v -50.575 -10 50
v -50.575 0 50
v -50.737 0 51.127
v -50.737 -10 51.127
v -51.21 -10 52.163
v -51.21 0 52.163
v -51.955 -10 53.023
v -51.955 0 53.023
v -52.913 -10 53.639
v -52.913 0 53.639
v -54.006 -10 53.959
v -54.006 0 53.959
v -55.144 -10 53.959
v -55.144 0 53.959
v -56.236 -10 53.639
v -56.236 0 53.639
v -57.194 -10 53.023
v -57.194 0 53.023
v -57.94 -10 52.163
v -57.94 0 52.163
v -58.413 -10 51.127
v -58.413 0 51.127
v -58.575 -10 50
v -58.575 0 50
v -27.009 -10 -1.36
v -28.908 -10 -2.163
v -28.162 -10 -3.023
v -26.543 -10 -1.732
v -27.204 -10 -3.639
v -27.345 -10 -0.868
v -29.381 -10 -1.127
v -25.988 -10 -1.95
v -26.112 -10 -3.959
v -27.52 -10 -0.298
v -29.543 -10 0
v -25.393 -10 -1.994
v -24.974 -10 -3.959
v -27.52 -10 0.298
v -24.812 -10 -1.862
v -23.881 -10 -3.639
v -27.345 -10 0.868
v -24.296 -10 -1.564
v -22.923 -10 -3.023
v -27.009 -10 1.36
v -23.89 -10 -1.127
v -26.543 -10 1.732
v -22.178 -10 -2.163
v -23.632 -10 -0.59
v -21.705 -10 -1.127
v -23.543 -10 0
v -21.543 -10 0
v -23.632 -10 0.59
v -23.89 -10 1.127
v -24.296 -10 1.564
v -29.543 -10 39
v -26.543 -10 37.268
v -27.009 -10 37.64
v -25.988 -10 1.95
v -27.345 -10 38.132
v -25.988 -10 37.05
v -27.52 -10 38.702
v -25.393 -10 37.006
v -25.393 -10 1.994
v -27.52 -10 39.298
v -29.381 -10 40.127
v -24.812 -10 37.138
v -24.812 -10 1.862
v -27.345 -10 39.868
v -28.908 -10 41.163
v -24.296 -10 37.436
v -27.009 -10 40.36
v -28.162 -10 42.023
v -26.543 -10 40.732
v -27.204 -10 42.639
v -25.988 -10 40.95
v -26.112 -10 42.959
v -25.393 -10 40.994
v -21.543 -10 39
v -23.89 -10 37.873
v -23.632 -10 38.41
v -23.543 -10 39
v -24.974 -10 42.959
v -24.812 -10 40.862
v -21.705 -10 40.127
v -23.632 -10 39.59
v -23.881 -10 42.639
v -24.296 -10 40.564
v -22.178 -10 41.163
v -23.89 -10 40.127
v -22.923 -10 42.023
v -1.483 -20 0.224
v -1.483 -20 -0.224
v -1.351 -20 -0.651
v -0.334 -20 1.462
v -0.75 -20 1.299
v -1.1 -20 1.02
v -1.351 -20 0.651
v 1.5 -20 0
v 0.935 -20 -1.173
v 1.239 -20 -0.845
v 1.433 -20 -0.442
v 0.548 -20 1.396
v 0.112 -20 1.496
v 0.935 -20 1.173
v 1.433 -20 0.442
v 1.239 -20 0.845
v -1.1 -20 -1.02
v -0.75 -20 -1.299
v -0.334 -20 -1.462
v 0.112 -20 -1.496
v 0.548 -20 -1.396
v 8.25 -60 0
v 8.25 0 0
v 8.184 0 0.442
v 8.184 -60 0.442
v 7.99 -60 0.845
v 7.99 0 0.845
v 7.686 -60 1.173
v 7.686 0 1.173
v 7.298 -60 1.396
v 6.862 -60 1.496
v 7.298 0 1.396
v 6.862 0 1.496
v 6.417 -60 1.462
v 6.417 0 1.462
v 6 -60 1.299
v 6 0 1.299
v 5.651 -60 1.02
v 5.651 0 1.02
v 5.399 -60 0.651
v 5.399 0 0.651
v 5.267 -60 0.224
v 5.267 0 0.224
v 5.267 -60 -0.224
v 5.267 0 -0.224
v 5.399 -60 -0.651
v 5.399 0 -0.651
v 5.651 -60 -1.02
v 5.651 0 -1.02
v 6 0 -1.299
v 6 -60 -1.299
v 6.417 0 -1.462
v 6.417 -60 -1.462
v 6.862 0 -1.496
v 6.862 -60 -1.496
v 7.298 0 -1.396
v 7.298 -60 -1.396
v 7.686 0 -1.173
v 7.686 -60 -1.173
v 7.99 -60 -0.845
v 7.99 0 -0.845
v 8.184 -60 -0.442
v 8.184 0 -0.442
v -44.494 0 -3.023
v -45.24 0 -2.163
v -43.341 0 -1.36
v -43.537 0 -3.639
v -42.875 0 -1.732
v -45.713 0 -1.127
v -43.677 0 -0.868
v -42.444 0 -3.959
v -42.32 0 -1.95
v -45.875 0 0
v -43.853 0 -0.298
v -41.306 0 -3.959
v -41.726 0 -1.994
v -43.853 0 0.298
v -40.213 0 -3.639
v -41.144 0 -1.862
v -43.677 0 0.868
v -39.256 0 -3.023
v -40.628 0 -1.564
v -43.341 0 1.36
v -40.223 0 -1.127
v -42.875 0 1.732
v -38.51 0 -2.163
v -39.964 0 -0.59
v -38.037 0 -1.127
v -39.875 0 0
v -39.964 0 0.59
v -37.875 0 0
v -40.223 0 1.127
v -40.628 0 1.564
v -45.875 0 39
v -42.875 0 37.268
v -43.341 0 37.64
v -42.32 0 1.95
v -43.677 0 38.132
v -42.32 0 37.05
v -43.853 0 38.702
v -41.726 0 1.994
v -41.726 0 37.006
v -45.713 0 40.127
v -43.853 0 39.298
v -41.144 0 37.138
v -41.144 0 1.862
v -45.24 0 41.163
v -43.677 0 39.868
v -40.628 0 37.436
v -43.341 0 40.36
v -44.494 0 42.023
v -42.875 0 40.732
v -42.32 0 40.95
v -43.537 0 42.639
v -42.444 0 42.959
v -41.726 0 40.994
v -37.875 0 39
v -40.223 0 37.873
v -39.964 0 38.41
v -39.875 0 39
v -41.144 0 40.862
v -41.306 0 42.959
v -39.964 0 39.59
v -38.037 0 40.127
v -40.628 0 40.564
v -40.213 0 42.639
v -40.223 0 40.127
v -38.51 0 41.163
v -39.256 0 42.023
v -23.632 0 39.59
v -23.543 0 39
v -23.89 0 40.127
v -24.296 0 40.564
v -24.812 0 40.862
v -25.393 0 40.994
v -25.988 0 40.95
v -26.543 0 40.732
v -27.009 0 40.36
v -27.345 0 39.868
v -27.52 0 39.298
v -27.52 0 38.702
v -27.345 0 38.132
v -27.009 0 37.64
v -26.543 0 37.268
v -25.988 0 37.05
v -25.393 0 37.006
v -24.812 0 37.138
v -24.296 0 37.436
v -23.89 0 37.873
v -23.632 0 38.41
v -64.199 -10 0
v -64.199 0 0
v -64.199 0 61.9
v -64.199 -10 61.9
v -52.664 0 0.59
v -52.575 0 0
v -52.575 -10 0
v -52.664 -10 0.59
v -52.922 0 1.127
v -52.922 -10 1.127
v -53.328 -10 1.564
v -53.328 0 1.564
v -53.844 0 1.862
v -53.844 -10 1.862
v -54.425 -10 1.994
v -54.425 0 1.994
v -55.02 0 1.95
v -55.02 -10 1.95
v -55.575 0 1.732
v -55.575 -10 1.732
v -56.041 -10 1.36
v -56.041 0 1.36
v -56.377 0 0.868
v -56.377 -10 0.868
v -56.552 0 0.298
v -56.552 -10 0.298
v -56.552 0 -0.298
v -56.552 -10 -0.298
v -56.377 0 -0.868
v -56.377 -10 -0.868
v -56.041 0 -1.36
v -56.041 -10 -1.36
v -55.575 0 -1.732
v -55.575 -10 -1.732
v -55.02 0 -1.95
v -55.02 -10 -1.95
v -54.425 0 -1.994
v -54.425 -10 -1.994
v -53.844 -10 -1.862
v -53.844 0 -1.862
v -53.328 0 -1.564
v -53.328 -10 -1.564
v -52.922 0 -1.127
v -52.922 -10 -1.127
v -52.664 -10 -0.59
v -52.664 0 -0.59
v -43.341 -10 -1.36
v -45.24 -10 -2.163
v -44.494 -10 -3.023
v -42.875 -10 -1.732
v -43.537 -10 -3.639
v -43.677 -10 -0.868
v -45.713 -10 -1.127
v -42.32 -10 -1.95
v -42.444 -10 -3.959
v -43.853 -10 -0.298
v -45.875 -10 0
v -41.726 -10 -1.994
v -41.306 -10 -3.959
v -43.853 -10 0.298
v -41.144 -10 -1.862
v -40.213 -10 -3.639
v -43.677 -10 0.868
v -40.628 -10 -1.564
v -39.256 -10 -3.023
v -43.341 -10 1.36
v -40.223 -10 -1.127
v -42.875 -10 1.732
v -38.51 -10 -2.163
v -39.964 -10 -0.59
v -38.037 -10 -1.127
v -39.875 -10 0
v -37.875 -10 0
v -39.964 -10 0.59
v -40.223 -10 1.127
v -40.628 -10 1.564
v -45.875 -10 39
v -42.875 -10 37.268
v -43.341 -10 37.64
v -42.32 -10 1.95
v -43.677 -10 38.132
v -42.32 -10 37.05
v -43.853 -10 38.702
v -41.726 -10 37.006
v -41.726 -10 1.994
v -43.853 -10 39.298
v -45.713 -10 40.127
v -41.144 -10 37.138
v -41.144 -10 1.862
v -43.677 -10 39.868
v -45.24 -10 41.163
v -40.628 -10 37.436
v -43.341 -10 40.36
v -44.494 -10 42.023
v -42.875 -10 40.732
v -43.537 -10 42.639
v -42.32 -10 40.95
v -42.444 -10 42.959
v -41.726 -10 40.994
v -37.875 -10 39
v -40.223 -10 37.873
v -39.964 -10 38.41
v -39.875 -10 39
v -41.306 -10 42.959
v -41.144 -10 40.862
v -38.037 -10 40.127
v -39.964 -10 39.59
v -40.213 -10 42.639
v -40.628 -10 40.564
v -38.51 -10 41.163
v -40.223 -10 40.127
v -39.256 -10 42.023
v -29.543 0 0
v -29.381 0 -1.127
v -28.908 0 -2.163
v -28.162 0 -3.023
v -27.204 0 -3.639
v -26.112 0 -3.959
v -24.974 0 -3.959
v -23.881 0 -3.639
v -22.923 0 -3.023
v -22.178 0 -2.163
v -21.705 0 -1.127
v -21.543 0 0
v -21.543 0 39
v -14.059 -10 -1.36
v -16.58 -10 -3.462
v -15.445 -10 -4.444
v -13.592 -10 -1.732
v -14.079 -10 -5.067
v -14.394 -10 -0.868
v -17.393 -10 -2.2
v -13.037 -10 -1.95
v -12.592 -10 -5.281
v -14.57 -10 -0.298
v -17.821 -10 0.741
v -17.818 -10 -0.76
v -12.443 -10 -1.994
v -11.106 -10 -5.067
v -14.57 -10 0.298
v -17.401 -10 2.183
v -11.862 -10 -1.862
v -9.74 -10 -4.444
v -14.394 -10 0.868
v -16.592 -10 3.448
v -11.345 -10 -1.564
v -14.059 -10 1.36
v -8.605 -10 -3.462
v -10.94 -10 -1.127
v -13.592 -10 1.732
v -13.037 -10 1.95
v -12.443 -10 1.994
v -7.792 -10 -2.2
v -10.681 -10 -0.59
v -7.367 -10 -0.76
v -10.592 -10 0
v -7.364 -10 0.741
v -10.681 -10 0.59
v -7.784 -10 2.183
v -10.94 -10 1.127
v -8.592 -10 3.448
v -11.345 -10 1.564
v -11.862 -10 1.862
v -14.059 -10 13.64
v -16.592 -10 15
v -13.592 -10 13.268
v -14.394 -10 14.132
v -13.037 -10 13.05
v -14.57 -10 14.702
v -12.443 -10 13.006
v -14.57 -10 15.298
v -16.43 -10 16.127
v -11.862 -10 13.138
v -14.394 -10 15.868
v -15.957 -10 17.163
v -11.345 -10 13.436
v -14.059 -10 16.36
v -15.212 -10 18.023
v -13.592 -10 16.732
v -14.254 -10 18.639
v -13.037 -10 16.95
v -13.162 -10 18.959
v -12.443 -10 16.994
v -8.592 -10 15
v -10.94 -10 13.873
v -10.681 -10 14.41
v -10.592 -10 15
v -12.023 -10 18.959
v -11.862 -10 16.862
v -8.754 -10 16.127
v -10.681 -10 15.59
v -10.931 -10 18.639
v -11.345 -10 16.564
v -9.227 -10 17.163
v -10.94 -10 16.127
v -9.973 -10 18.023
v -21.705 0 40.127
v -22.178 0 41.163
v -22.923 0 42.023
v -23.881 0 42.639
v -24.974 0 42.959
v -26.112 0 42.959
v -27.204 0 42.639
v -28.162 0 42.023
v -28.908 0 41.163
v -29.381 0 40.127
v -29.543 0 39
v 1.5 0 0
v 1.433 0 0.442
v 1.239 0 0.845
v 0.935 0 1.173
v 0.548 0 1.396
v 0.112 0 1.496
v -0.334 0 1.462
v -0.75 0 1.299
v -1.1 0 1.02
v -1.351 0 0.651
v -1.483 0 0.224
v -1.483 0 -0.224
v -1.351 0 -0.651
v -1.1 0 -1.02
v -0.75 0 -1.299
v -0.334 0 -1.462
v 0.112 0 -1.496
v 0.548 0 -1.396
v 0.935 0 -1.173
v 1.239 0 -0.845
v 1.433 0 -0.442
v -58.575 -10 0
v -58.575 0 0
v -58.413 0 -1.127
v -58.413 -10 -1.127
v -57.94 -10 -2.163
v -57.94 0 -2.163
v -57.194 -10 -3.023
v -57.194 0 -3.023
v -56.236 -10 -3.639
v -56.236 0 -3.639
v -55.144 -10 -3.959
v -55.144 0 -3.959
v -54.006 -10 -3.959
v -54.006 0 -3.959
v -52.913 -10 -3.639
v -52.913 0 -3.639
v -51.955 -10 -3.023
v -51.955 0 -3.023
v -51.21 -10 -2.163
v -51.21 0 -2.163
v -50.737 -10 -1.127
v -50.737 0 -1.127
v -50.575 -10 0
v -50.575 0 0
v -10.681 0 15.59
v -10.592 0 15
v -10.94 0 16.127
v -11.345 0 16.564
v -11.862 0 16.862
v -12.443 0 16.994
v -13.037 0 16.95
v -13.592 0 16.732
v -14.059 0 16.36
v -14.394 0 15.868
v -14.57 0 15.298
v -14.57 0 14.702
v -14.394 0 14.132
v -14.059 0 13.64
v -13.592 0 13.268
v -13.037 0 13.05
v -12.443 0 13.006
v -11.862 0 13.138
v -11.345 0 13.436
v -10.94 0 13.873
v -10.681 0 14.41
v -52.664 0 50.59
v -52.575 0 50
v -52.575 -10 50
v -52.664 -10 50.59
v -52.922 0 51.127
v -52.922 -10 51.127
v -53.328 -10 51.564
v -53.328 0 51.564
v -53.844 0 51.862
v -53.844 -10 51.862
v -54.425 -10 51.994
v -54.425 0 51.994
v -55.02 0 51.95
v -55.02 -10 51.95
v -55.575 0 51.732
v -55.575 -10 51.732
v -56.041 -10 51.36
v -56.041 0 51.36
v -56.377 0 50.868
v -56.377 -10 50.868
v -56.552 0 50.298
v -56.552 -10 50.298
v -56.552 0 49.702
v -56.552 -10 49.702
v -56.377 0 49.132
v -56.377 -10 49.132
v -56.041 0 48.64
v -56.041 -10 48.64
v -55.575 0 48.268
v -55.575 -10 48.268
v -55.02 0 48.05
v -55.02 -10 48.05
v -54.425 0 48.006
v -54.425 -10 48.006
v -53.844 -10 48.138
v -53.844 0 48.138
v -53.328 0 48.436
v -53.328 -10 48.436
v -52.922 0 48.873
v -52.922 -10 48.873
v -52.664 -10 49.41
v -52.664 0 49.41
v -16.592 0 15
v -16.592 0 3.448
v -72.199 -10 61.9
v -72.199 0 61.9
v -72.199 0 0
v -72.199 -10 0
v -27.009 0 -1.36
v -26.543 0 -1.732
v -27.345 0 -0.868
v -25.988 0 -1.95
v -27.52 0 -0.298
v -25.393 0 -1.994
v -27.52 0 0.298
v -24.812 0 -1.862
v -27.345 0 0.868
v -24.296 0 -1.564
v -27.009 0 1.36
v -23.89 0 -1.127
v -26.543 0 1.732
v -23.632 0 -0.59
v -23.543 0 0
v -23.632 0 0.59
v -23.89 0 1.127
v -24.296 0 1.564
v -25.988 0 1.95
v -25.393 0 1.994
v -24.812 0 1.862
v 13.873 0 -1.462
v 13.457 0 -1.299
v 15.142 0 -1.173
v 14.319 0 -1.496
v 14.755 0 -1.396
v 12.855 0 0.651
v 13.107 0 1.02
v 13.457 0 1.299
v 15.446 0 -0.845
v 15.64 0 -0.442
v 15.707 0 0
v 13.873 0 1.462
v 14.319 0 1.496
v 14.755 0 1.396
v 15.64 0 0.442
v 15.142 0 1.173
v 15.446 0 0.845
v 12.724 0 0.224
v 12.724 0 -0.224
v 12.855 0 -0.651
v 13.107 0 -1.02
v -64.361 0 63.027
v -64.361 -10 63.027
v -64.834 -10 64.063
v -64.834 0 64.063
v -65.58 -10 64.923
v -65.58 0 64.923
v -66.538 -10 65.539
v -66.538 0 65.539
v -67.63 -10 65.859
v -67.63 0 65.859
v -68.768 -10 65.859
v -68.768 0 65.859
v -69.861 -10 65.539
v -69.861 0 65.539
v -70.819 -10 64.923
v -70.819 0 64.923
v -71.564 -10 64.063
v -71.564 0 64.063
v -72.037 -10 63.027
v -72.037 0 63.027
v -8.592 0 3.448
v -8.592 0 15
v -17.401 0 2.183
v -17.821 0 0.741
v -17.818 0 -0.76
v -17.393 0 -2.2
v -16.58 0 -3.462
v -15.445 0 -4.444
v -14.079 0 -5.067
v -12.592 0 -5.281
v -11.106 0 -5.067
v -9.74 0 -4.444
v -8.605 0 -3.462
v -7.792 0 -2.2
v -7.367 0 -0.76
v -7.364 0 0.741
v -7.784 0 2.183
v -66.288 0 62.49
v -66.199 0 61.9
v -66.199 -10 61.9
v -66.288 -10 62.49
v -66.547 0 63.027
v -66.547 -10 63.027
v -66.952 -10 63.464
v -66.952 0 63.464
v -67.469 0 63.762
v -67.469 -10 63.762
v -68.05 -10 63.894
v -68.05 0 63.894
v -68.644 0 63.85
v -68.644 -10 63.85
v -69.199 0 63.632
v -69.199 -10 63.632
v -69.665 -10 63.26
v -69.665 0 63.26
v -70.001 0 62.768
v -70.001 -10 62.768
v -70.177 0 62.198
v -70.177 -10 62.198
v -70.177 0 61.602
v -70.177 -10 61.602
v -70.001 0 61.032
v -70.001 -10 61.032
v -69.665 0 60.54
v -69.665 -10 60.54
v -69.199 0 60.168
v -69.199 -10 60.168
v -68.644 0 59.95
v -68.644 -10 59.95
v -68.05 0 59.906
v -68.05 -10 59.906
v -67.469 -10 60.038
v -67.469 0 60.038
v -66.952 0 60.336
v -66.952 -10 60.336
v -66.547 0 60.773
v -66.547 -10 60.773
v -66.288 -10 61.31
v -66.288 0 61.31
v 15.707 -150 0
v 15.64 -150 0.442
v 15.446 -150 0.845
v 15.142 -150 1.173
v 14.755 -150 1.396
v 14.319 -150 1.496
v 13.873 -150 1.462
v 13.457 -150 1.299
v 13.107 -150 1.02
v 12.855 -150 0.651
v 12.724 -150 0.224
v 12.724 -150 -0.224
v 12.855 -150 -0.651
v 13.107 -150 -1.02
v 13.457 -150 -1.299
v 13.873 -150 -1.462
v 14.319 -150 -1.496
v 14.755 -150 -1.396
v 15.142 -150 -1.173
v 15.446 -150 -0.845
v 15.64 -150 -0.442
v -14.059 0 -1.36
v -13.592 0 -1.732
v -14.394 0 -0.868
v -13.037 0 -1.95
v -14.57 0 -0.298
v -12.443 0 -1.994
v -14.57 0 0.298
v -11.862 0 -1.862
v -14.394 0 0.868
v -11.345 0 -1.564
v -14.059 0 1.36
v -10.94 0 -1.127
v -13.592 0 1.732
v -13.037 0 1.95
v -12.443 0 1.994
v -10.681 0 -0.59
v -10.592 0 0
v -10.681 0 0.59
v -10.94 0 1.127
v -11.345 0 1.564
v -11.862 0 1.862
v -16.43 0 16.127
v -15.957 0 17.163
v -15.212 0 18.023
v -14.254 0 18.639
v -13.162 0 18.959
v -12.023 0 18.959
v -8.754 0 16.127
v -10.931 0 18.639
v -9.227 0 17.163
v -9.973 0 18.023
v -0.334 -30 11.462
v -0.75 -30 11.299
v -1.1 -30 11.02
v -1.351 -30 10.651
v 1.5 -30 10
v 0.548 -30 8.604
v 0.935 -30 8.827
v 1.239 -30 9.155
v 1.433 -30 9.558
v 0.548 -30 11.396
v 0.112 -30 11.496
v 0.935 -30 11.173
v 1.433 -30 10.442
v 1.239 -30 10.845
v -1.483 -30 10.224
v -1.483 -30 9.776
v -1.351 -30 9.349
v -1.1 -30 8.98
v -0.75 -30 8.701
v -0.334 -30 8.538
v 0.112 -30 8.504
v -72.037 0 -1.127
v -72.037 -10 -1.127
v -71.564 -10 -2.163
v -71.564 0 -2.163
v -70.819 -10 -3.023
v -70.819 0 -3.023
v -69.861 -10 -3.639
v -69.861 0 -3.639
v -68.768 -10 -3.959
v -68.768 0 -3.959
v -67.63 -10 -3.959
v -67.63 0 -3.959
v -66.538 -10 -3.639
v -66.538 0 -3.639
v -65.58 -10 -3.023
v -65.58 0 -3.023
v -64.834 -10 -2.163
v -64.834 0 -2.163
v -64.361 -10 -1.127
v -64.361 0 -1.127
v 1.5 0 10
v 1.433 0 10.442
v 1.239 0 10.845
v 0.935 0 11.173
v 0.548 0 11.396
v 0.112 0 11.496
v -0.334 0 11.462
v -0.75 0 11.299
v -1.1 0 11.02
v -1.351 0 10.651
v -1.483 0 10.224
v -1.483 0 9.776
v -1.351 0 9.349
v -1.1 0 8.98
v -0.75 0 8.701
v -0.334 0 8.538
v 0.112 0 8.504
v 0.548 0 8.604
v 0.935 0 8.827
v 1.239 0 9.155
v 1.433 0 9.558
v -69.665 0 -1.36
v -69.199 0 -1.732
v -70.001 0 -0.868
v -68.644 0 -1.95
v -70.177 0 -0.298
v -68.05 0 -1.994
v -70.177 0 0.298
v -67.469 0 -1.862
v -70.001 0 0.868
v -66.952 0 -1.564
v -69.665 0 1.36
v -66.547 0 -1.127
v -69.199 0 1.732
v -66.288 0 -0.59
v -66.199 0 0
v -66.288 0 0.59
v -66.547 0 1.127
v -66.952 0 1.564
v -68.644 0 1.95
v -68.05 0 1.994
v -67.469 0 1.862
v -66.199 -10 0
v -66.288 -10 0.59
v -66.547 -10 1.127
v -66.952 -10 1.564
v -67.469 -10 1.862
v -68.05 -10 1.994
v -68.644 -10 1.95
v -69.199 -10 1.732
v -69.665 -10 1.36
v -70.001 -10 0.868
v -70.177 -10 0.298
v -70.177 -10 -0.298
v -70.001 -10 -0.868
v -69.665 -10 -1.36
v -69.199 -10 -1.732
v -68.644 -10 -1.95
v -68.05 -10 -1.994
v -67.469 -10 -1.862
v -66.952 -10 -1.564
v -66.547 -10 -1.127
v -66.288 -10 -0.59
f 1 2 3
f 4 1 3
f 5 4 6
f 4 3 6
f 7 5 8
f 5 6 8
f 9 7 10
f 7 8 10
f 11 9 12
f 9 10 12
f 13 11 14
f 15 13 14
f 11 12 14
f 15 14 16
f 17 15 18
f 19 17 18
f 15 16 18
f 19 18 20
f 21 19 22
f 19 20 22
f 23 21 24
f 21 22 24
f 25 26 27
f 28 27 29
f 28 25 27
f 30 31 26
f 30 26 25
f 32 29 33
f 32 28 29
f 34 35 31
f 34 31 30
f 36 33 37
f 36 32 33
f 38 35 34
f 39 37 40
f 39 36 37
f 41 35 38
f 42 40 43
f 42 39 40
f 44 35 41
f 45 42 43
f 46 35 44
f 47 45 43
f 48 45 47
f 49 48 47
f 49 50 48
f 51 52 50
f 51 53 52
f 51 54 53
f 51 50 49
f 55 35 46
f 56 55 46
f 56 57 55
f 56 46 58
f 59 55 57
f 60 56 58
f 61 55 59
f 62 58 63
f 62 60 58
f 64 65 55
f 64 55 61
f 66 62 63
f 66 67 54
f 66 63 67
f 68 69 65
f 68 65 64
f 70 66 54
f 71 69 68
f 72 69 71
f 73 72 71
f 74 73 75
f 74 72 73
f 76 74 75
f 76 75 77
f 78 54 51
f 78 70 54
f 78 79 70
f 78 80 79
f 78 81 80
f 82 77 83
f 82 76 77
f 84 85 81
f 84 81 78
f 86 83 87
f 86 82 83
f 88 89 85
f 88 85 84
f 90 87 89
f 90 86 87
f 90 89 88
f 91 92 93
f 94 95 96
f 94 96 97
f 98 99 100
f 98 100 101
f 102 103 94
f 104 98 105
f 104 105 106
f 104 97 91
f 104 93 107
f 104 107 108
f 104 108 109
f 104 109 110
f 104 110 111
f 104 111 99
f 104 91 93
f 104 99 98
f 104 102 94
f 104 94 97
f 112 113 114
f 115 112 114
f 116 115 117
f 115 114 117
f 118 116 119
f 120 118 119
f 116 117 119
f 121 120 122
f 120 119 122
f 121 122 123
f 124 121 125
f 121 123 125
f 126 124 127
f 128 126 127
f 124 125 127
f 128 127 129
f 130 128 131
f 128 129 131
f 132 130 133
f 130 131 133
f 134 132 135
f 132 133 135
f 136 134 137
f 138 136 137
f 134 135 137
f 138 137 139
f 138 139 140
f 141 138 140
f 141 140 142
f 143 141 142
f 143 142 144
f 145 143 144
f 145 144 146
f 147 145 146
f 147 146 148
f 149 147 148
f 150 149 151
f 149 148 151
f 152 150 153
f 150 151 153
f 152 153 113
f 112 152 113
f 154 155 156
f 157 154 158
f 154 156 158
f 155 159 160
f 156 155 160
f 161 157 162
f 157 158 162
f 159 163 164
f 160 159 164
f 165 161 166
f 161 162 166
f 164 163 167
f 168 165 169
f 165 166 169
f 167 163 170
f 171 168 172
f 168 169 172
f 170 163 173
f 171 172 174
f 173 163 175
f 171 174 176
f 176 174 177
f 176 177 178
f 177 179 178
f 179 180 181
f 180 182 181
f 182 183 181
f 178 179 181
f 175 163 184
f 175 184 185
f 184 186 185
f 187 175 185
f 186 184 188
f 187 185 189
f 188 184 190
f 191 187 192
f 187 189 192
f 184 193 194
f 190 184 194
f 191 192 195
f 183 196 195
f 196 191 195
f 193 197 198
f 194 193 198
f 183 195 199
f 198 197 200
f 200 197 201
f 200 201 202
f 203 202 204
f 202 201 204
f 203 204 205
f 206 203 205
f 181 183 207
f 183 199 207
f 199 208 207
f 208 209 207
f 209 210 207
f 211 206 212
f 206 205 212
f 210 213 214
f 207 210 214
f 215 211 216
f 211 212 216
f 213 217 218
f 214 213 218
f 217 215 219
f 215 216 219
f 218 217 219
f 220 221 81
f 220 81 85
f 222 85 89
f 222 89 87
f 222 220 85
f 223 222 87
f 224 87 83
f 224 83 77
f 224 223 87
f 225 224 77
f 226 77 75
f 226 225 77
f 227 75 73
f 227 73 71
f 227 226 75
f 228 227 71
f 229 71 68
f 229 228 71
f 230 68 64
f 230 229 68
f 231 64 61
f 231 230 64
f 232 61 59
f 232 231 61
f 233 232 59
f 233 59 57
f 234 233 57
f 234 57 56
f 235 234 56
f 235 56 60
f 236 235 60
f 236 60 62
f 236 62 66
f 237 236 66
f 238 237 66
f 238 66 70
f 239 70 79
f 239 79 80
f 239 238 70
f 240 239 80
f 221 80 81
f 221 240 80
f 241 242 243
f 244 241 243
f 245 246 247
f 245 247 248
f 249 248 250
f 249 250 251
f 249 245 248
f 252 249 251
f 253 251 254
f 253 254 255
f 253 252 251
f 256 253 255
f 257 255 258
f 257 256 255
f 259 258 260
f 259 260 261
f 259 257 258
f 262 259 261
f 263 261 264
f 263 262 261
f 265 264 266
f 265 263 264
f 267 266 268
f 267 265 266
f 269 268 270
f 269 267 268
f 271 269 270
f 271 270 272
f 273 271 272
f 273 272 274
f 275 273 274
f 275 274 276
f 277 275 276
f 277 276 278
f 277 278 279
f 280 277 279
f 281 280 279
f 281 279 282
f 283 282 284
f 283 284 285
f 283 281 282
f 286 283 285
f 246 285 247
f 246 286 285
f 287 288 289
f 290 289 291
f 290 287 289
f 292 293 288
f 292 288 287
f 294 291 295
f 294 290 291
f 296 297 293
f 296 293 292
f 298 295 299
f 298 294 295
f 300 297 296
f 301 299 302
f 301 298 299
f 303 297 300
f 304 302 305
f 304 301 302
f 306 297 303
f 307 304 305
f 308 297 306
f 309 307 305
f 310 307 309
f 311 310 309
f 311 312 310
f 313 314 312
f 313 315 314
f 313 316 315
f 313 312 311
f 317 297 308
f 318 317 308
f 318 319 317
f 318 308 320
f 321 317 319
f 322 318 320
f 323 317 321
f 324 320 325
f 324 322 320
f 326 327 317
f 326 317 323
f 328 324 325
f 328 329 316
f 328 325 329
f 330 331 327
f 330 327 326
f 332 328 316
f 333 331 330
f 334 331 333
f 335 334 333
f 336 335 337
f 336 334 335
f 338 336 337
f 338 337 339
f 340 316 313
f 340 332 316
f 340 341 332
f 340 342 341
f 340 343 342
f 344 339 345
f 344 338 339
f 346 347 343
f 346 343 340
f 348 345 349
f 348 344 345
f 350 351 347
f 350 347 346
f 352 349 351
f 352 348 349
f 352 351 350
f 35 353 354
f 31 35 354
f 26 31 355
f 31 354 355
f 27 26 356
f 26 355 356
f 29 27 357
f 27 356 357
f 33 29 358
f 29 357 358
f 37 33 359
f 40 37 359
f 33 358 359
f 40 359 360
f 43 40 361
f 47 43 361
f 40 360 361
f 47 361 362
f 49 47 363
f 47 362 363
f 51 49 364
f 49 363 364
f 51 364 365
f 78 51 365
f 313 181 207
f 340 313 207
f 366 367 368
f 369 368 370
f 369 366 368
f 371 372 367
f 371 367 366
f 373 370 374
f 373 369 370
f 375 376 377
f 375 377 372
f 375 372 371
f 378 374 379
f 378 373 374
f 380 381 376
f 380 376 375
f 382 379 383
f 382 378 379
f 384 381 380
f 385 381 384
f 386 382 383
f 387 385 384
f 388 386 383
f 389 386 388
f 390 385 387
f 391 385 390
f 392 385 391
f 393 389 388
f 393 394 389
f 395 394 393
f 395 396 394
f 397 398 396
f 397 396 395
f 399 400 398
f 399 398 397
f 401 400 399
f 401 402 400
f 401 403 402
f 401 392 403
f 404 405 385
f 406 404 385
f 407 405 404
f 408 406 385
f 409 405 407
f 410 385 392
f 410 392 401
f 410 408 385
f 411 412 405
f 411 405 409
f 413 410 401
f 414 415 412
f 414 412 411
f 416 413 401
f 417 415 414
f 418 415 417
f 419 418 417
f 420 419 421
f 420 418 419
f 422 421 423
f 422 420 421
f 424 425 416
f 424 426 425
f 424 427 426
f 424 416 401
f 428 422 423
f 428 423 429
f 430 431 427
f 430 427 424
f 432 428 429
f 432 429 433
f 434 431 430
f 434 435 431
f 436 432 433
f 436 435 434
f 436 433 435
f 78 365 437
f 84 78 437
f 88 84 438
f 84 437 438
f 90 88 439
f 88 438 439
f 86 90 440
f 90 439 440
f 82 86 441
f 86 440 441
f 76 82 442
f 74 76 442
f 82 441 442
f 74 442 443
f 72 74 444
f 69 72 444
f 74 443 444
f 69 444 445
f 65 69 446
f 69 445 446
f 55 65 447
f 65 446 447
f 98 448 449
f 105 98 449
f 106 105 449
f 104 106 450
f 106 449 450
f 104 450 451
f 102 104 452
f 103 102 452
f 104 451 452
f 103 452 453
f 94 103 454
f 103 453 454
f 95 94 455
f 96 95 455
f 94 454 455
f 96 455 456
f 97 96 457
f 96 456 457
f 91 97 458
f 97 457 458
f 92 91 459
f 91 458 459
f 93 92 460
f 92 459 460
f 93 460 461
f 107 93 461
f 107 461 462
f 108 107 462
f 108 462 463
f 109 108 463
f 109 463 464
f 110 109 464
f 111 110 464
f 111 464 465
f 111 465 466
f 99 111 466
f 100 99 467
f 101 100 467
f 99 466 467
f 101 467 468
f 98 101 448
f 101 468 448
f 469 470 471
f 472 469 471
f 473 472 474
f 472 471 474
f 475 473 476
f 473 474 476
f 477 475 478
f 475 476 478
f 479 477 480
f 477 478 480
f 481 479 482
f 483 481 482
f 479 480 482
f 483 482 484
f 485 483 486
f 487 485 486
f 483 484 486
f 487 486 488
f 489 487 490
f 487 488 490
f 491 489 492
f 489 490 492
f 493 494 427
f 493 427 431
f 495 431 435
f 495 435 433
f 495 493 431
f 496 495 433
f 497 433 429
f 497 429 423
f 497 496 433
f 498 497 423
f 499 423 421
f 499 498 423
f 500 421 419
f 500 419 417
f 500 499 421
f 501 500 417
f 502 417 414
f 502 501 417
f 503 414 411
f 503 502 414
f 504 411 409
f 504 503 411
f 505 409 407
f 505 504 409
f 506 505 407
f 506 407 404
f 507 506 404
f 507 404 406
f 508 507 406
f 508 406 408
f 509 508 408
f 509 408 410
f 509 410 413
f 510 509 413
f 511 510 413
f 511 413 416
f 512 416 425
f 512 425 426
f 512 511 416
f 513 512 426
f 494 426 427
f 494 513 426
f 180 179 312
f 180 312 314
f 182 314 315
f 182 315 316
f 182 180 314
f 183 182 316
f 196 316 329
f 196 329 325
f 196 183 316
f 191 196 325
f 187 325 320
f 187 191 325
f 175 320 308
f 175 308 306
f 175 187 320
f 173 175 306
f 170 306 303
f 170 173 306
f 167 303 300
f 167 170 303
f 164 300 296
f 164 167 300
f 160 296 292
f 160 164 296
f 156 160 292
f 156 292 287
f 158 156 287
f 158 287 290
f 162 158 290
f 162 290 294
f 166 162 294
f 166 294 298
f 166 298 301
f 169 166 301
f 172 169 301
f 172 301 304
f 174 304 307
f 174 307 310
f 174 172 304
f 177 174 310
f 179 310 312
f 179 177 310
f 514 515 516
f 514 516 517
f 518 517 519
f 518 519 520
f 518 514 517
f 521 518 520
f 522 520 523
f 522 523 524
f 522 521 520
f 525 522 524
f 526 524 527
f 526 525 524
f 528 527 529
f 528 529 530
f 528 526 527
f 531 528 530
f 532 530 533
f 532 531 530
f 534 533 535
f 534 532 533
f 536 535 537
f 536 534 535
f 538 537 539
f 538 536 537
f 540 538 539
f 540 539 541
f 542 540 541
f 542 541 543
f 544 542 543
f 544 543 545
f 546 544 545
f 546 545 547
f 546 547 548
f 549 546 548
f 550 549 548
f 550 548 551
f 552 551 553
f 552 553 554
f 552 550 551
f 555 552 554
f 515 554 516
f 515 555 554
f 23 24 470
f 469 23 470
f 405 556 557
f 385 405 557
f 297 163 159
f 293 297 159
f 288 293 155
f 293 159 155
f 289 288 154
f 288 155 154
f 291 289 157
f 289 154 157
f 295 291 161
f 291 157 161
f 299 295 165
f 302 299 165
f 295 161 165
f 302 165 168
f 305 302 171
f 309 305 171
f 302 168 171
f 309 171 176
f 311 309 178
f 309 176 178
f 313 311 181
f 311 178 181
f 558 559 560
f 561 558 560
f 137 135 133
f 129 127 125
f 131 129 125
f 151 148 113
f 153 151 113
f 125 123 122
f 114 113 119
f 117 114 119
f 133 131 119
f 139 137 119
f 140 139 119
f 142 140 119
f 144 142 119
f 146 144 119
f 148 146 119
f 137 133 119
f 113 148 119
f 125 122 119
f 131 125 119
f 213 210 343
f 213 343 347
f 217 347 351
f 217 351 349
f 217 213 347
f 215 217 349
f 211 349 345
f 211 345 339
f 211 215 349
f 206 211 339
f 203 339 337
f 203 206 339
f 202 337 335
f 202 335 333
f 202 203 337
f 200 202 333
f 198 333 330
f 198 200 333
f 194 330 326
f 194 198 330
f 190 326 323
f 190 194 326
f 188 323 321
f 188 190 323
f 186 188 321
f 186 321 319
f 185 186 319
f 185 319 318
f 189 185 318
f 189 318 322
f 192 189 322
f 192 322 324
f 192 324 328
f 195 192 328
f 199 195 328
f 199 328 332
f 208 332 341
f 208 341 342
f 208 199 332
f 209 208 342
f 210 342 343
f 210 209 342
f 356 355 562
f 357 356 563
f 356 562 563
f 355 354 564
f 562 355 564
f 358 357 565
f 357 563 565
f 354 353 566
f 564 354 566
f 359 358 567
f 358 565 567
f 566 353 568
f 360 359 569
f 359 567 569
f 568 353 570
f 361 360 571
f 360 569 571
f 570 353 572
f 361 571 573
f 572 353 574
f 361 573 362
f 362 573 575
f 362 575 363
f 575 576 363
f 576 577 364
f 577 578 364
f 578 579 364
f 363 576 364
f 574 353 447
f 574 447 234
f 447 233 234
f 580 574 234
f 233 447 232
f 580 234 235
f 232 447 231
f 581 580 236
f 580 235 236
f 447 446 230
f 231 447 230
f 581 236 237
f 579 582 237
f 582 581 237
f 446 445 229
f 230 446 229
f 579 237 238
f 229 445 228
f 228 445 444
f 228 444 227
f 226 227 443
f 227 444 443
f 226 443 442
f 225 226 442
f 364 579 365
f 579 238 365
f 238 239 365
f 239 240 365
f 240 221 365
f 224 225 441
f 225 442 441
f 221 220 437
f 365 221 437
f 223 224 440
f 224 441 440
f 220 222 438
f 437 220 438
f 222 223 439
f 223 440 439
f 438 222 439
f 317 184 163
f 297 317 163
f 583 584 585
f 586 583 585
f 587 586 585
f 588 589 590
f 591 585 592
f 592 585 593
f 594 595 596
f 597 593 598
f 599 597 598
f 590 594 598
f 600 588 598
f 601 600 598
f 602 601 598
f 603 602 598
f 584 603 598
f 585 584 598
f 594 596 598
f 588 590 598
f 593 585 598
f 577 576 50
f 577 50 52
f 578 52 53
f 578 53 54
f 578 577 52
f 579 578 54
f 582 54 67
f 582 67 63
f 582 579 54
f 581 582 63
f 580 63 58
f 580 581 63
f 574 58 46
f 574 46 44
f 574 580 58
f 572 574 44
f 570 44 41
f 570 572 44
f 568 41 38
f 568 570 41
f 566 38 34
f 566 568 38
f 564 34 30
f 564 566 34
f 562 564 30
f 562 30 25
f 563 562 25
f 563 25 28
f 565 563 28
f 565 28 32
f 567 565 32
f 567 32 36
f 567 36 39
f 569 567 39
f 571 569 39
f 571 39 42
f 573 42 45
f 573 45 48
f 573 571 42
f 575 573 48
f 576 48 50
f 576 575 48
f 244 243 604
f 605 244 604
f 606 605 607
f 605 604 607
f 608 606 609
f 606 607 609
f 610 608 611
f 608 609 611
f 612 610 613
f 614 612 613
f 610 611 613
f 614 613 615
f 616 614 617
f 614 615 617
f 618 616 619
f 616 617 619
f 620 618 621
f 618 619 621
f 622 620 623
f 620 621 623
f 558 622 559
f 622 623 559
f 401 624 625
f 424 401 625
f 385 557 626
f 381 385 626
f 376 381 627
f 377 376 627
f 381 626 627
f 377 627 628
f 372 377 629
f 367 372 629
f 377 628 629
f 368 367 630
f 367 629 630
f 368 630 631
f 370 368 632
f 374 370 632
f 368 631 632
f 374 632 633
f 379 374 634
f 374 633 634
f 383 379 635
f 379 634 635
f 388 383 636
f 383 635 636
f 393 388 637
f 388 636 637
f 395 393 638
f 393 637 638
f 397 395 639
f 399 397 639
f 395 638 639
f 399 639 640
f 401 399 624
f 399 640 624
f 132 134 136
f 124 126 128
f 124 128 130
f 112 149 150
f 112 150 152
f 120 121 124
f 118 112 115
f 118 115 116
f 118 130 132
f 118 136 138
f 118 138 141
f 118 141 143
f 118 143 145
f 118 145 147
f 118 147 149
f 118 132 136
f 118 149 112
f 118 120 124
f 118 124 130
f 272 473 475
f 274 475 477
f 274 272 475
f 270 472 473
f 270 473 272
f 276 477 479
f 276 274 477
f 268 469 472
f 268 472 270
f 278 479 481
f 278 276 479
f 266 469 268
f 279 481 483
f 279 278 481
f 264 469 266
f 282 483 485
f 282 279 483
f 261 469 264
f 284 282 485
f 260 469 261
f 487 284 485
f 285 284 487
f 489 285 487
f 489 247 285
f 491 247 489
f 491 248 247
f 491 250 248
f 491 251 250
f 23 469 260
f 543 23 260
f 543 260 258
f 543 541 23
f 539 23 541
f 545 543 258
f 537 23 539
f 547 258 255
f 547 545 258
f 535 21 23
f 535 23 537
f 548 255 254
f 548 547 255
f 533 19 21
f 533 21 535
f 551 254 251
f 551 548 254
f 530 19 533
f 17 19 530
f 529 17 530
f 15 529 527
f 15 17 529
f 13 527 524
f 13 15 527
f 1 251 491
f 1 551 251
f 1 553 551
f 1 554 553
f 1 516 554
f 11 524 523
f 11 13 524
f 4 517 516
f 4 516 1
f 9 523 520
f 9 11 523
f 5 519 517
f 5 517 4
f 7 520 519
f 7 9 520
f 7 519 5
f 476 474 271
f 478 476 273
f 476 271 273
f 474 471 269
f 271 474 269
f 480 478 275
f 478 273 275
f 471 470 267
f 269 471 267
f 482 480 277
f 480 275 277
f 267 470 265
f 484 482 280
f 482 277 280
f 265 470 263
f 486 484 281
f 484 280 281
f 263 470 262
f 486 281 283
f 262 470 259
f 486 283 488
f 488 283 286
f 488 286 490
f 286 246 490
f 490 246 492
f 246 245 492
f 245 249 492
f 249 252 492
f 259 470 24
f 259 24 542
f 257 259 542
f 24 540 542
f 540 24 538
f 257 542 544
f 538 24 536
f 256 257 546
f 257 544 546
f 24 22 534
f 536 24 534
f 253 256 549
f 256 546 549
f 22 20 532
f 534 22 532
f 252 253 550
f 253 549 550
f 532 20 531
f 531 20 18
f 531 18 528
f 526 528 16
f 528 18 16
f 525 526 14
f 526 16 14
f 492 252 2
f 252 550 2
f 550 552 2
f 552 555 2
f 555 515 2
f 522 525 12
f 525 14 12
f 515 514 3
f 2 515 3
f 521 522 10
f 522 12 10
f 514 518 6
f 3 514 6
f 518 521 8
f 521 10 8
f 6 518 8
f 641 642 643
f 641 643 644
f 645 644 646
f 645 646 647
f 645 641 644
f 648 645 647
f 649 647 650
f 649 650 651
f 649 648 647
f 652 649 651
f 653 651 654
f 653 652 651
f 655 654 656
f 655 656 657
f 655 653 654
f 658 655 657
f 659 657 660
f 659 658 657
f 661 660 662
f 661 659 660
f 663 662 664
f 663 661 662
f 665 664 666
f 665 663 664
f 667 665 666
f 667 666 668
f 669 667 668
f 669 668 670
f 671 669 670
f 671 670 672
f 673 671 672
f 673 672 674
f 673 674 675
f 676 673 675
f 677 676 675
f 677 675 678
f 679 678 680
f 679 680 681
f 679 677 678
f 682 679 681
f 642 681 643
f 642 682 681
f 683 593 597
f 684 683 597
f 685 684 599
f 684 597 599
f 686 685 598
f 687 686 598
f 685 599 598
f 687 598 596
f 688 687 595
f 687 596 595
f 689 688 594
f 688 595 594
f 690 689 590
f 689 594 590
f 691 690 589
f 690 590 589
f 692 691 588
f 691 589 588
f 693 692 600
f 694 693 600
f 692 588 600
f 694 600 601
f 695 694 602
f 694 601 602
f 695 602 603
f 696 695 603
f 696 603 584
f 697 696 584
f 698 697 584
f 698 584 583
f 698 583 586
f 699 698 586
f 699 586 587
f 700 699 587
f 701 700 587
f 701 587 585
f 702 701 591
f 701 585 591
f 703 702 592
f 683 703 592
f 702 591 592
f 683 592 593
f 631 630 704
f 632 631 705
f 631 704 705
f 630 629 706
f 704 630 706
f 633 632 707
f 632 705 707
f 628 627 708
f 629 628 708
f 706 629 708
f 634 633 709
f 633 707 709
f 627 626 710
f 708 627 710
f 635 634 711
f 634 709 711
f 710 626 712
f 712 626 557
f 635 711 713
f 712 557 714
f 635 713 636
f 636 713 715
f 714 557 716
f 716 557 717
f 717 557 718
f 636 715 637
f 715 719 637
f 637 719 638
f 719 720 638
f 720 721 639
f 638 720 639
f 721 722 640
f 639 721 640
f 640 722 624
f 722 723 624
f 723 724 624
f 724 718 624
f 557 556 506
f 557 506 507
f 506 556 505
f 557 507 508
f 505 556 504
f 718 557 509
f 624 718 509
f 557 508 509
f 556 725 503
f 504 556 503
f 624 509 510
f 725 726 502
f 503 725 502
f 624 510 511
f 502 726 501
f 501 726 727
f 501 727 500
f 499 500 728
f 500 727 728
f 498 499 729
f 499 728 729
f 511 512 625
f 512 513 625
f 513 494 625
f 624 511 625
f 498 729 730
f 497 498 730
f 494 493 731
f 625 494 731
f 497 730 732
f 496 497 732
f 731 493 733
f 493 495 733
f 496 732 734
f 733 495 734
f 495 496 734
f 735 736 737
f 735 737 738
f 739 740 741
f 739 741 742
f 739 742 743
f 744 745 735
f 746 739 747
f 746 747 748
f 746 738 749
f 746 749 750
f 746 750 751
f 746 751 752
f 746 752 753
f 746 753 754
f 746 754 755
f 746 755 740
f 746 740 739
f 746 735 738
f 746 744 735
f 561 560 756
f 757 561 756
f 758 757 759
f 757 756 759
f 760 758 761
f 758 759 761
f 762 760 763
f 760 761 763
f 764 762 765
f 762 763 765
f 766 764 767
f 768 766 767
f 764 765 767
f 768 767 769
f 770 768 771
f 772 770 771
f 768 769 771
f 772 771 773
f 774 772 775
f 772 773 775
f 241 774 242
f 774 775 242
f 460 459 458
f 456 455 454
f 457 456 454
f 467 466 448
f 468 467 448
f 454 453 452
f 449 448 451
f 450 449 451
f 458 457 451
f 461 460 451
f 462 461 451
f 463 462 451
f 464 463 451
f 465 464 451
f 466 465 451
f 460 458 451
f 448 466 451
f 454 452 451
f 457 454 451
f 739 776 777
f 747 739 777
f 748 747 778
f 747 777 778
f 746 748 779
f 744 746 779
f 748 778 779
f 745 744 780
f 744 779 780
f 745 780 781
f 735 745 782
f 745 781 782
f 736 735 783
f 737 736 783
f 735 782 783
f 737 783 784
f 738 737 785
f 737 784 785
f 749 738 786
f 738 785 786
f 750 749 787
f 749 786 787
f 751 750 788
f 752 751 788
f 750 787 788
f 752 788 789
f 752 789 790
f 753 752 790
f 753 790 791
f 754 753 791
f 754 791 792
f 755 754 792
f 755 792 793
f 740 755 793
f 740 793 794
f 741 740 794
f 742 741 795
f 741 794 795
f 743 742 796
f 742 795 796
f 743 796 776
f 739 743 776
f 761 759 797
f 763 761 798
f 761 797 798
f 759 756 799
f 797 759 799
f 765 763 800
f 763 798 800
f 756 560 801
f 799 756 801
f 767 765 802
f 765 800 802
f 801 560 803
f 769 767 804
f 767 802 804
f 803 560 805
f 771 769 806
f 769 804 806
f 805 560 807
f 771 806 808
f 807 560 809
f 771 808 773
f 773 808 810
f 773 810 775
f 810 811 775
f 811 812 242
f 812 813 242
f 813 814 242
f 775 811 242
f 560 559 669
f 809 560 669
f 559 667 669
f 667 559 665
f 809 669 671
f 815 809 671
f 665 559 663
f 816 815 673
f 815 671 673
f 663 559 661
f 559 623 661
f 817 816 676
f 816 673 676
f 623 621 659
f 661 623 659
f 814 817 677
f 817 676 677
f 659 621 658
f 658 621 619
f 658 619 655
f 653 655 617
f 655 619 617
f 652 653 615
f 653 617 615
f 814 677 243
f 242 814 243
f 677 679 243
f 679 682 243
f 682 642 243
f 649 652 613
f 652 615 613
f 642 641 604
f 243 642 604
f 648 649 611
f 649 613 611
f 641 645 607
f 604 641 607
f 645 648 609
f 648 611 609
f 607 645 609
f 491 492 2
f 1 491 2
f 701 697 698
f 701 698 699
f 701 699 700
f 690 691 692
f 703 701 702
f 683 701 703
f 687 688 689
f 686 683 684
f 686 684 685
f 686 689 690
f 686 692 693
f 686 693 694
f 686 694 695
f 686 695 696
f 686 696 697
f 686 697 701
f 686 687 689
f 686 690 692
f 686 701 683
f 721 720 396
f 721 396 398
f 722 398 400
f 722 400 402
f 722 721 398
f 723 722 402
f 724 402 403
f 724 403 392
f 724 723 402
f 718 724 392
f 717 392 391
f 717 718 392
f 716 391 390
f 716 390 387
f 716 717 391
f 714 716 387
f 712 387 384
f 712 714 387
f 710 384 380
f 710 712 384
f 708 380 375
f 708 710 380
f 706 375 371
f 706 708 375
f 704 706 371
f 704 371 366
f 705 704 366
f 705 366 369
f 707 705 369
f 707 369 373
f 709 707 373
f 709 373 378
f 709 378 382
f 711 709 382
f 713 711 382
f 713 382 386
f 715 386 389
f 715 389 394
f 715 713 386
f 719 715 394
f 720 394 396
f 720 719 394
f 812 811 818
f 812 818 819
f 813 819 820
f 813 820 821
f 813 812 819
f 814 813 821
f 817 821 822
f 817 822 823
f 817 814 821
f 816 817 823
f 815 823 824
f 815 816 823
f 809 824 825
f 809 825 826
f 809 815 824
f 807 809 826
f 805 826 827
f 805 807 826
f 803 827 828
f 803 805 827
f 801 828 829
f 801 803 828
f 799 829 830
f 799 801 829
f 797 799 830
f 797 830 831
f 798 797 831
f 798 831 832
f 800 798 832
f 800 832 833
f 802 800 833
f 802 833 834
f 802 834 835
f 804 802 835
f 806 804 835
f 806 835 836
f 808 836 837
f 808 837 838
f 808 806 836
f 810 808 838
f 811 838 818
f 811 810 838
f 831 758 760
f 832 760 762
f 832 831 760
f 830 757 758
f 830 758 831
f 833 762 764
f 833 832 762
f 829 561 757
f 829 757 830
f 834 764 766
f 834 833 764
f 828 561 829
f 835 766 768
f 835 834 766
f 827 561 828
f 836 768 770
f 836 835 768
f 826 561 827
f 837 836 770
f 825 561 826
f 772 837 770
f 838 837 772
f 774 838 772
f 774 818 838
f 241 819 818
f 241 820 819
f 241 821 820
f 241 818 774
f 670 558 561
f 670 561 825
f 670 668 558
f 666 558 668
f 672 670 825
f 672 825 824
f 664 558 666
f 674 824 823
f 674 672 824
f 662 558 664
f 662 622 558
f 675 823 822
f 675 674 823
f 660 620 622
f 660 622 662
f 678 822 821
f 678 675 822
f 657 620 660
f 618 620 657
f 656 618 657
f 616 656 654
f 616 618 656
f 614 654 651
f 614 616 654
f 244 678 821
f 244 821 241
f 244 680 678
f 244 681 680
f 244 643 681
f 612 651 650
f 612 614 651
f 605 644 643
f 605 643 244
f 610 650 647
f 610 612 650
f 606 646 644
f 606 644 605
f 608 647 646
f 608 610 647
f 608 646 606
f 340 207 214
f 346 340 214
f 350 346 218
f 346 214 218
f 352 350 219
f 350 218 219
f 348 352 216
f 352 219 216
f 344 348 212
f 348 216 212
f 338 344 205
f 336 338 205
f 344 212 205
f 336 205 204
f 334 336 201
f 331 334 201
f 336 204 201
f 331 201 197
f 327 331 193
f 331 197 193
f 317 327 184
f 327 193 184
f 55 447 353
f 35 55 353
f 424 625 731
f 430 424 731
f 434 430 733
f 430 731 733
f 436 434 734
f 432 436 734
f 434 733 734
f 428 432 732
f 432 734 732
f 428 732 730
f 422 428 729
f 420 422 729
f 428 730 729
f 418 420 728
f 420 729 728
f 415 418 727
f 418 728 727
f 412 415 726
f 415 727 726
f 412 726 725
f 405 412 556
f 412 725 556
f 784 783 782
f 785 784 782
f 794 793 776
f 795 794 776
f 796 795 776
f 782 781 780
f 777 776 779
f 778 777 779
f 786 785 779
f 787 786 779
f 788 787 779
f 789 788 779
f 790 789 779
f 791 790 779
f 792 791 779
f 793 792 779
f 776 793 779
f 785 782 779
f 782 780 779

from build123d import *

# Parameters (mm, degrees)
F1_R      = 2
F2_DEPTH  = 10
F3_R      = 2
F4_DEPTH  = 10
F5_R      = 2
F6_DEPTH  = 10
F7_R      = 2
F8_DEPTH  = 10
F9_R      = 2
F10_DEPTH = 10
F11_R     = 1.5
F12_DEPTH = 20
F13_R     = 1.5
F14_DEPTH = 60
F15_DEPTH = 150
F16_R     = 1.5
F17_DEPTH = 30


# Not quite as in the source:
# - a feature names something its author has since deleted; it is built from what else it names


with BuildPart() as f2:
    # F1 (on Front) → F2 (new body)
    with BuildSketch(Plane.XZ):
        with BuildLine():
            Line((-8.5924360901, 3.4478561794), (-8.5924360901, 15))
            ThreePointArc((-8.5924360901, 15), (-12.5924360901, 19), (-16.5924360901, 15))
            Line((-16.5924360901, 15), (-16.5924360901, 3.4478561794))
            ThreePointArc((-16.5924360901, 3.4478561794), (-12.5924360901, -5.2808817667), (-8.5924360901, 3.4478561794))
        make_face()
        with Locations((-12.5924360901, 0)):
            Circle(F1_R, mode=Mode.SUBTRACT)
        with Locations((-12.5924360901, 15)):
            Circle(F1_R, mode=Mode.SUBTRACT)
    extrude(amount=F2_DEPTH)


with BuildPart() as f4:
    # F3 (on Front) → F4 (new body)
    with BuildSketch(Plane.XZ):
        with BuildLine():
            Line((-29.5428169801, 39), (-29.5428169801, 0))
            ThreePointArc((-29.5428169801, 0), (-25.5428169801, -4), (-21.5428169801, 0))
            Line((-21.5428169801, 0), (-21.5428169801, 39))
            ThreePointArc((-21.5428169801, 39), (-25.5428169801, 43), (-29.5428169801, 39))
        make_face()
        with Locations((-25.5428169801, 0)):
            Circle(F3_R, mode=Mode.SUBTRACT)
        with Locations((-25.5428169801, 39)):
            Circle(F3_R, mode=Mode.SUBTRACT)
    extrude(amount=F4_DEPTH)


with BuildPart() as f6:
    # F5 (on Front) → F6 (new body)
    with BuildSketch(Plane.XZ):
        with BuildLine():
            Line((-45.8750046201, 39), (-45.8750046201, 0))
            ThreePointArc((-45.8750046201, 0), (-41.8750046201, -4), (-37.8750046201, 0))
            Line((-37.8750046201, 0), (-37.8750046201, 39))
            ThreePointArc((-37.8750046201, 39), (-41.8750046201, 43), (-45.8750046201, 39))
        make_face()
        with Locations((-41.8750046201, 0)):
            Circle(F5_R, mode=Mode.SUBTRACT)
        with Locations((-41.8750046201, 39)):
            Circle(F5_R, mode=Mode.SUBTRACT)
    extrude(amount=F6_DEPTH)


with BuildPart() as f8:
    # F7 (on Front) → F8 (new body)
    with BuildSketch(Plane.XZ):
        with BuildLine():
            Line((-58.5748284761, 50), (-58.5748284761, 0))
            ThreePointArc((-58.5748284761, 0), (-54.5748284761, -4), (-50.5748284761, 0))
            Line((-50.5748284761, 0), (-50.5748284761, 50))
            ThreePointArc((-50.5748284761, 50), (-54.5748284761, 54), (-58.5748284761, 50))
        make_face()
        with Locations((-54.5748284761, 0)):
            Circle(F7_R, mode=Mode.SUBTRACT)
        with Locations((-54.5748284761, 50)):
            Circle(F7_R, mode=Mode.SUBTRACT)
    extrude(amount=F8_DEPTH)


with BuildPart() as f10:
    # F9 (on Front) → F10 (new body)
    with BuildSketch(Plane.XZ):
        with BuildLine():
            Line((-72.1991949677, 61.9), (-72.1991949677, 0))
            ThreePointArc((-72.1991949677, 0), (-68.1991949677, -4), (-64.1991949677, 0))
            Line((-64.1991949677, 0), (-64.1991949677, 61.9))
            ThreePointArc((-64.1991949677, 61.9), (-68.1991949677, 65.9), (-72.1991949677, 61.9))
        make_face()
        with Locations((-68.1991949677, 0)):
            Circle(F9_R, mode=Mode.SUBTRACT)
        with Locations((-68.1991949677, 61.9)):
            Circle(F9_R, mode=Mode.SUBTRACT)
    extrude(amount=F10_DEPTH)


with BuildPart() as f12:
    # F11 (on Front) → F12 (new body)
    with BuildSketch(Plane.XZ):
        Circle(F11_R)
    extrude(amount=F12_DEPTH)


with BuildPart() as f14:
    # F13 (on Front) → F14 (new body)
    with BuildSketch(Plane.XZ):
        with Locations((6.7503562369, 0)):
            Circle(F13_R)
    extrude(amount=F14_DEPTH)


with BuildPart() as f15:
    # F13 (on Front) → F15 (new body)
    with BuildSketch(Plane.XZ):
        with Locations((14.2067680135, 0)):
            Circle(F13_R)
    extrude(amount=F15_DEPTH)


with BuildPart() as f17:
    # F16 (on Front) → F17 (new body)
    with BuildSketch(Plane.XZ):
        with Locations((0, 10)):
            Circle(F16_R)
    extrude(amount=F17_DEPTH)


solid = Compound([f2.part, f4.part, f6.part, f8.part, f10.part, f12.part, f14.part, f15.part, f17.part])
